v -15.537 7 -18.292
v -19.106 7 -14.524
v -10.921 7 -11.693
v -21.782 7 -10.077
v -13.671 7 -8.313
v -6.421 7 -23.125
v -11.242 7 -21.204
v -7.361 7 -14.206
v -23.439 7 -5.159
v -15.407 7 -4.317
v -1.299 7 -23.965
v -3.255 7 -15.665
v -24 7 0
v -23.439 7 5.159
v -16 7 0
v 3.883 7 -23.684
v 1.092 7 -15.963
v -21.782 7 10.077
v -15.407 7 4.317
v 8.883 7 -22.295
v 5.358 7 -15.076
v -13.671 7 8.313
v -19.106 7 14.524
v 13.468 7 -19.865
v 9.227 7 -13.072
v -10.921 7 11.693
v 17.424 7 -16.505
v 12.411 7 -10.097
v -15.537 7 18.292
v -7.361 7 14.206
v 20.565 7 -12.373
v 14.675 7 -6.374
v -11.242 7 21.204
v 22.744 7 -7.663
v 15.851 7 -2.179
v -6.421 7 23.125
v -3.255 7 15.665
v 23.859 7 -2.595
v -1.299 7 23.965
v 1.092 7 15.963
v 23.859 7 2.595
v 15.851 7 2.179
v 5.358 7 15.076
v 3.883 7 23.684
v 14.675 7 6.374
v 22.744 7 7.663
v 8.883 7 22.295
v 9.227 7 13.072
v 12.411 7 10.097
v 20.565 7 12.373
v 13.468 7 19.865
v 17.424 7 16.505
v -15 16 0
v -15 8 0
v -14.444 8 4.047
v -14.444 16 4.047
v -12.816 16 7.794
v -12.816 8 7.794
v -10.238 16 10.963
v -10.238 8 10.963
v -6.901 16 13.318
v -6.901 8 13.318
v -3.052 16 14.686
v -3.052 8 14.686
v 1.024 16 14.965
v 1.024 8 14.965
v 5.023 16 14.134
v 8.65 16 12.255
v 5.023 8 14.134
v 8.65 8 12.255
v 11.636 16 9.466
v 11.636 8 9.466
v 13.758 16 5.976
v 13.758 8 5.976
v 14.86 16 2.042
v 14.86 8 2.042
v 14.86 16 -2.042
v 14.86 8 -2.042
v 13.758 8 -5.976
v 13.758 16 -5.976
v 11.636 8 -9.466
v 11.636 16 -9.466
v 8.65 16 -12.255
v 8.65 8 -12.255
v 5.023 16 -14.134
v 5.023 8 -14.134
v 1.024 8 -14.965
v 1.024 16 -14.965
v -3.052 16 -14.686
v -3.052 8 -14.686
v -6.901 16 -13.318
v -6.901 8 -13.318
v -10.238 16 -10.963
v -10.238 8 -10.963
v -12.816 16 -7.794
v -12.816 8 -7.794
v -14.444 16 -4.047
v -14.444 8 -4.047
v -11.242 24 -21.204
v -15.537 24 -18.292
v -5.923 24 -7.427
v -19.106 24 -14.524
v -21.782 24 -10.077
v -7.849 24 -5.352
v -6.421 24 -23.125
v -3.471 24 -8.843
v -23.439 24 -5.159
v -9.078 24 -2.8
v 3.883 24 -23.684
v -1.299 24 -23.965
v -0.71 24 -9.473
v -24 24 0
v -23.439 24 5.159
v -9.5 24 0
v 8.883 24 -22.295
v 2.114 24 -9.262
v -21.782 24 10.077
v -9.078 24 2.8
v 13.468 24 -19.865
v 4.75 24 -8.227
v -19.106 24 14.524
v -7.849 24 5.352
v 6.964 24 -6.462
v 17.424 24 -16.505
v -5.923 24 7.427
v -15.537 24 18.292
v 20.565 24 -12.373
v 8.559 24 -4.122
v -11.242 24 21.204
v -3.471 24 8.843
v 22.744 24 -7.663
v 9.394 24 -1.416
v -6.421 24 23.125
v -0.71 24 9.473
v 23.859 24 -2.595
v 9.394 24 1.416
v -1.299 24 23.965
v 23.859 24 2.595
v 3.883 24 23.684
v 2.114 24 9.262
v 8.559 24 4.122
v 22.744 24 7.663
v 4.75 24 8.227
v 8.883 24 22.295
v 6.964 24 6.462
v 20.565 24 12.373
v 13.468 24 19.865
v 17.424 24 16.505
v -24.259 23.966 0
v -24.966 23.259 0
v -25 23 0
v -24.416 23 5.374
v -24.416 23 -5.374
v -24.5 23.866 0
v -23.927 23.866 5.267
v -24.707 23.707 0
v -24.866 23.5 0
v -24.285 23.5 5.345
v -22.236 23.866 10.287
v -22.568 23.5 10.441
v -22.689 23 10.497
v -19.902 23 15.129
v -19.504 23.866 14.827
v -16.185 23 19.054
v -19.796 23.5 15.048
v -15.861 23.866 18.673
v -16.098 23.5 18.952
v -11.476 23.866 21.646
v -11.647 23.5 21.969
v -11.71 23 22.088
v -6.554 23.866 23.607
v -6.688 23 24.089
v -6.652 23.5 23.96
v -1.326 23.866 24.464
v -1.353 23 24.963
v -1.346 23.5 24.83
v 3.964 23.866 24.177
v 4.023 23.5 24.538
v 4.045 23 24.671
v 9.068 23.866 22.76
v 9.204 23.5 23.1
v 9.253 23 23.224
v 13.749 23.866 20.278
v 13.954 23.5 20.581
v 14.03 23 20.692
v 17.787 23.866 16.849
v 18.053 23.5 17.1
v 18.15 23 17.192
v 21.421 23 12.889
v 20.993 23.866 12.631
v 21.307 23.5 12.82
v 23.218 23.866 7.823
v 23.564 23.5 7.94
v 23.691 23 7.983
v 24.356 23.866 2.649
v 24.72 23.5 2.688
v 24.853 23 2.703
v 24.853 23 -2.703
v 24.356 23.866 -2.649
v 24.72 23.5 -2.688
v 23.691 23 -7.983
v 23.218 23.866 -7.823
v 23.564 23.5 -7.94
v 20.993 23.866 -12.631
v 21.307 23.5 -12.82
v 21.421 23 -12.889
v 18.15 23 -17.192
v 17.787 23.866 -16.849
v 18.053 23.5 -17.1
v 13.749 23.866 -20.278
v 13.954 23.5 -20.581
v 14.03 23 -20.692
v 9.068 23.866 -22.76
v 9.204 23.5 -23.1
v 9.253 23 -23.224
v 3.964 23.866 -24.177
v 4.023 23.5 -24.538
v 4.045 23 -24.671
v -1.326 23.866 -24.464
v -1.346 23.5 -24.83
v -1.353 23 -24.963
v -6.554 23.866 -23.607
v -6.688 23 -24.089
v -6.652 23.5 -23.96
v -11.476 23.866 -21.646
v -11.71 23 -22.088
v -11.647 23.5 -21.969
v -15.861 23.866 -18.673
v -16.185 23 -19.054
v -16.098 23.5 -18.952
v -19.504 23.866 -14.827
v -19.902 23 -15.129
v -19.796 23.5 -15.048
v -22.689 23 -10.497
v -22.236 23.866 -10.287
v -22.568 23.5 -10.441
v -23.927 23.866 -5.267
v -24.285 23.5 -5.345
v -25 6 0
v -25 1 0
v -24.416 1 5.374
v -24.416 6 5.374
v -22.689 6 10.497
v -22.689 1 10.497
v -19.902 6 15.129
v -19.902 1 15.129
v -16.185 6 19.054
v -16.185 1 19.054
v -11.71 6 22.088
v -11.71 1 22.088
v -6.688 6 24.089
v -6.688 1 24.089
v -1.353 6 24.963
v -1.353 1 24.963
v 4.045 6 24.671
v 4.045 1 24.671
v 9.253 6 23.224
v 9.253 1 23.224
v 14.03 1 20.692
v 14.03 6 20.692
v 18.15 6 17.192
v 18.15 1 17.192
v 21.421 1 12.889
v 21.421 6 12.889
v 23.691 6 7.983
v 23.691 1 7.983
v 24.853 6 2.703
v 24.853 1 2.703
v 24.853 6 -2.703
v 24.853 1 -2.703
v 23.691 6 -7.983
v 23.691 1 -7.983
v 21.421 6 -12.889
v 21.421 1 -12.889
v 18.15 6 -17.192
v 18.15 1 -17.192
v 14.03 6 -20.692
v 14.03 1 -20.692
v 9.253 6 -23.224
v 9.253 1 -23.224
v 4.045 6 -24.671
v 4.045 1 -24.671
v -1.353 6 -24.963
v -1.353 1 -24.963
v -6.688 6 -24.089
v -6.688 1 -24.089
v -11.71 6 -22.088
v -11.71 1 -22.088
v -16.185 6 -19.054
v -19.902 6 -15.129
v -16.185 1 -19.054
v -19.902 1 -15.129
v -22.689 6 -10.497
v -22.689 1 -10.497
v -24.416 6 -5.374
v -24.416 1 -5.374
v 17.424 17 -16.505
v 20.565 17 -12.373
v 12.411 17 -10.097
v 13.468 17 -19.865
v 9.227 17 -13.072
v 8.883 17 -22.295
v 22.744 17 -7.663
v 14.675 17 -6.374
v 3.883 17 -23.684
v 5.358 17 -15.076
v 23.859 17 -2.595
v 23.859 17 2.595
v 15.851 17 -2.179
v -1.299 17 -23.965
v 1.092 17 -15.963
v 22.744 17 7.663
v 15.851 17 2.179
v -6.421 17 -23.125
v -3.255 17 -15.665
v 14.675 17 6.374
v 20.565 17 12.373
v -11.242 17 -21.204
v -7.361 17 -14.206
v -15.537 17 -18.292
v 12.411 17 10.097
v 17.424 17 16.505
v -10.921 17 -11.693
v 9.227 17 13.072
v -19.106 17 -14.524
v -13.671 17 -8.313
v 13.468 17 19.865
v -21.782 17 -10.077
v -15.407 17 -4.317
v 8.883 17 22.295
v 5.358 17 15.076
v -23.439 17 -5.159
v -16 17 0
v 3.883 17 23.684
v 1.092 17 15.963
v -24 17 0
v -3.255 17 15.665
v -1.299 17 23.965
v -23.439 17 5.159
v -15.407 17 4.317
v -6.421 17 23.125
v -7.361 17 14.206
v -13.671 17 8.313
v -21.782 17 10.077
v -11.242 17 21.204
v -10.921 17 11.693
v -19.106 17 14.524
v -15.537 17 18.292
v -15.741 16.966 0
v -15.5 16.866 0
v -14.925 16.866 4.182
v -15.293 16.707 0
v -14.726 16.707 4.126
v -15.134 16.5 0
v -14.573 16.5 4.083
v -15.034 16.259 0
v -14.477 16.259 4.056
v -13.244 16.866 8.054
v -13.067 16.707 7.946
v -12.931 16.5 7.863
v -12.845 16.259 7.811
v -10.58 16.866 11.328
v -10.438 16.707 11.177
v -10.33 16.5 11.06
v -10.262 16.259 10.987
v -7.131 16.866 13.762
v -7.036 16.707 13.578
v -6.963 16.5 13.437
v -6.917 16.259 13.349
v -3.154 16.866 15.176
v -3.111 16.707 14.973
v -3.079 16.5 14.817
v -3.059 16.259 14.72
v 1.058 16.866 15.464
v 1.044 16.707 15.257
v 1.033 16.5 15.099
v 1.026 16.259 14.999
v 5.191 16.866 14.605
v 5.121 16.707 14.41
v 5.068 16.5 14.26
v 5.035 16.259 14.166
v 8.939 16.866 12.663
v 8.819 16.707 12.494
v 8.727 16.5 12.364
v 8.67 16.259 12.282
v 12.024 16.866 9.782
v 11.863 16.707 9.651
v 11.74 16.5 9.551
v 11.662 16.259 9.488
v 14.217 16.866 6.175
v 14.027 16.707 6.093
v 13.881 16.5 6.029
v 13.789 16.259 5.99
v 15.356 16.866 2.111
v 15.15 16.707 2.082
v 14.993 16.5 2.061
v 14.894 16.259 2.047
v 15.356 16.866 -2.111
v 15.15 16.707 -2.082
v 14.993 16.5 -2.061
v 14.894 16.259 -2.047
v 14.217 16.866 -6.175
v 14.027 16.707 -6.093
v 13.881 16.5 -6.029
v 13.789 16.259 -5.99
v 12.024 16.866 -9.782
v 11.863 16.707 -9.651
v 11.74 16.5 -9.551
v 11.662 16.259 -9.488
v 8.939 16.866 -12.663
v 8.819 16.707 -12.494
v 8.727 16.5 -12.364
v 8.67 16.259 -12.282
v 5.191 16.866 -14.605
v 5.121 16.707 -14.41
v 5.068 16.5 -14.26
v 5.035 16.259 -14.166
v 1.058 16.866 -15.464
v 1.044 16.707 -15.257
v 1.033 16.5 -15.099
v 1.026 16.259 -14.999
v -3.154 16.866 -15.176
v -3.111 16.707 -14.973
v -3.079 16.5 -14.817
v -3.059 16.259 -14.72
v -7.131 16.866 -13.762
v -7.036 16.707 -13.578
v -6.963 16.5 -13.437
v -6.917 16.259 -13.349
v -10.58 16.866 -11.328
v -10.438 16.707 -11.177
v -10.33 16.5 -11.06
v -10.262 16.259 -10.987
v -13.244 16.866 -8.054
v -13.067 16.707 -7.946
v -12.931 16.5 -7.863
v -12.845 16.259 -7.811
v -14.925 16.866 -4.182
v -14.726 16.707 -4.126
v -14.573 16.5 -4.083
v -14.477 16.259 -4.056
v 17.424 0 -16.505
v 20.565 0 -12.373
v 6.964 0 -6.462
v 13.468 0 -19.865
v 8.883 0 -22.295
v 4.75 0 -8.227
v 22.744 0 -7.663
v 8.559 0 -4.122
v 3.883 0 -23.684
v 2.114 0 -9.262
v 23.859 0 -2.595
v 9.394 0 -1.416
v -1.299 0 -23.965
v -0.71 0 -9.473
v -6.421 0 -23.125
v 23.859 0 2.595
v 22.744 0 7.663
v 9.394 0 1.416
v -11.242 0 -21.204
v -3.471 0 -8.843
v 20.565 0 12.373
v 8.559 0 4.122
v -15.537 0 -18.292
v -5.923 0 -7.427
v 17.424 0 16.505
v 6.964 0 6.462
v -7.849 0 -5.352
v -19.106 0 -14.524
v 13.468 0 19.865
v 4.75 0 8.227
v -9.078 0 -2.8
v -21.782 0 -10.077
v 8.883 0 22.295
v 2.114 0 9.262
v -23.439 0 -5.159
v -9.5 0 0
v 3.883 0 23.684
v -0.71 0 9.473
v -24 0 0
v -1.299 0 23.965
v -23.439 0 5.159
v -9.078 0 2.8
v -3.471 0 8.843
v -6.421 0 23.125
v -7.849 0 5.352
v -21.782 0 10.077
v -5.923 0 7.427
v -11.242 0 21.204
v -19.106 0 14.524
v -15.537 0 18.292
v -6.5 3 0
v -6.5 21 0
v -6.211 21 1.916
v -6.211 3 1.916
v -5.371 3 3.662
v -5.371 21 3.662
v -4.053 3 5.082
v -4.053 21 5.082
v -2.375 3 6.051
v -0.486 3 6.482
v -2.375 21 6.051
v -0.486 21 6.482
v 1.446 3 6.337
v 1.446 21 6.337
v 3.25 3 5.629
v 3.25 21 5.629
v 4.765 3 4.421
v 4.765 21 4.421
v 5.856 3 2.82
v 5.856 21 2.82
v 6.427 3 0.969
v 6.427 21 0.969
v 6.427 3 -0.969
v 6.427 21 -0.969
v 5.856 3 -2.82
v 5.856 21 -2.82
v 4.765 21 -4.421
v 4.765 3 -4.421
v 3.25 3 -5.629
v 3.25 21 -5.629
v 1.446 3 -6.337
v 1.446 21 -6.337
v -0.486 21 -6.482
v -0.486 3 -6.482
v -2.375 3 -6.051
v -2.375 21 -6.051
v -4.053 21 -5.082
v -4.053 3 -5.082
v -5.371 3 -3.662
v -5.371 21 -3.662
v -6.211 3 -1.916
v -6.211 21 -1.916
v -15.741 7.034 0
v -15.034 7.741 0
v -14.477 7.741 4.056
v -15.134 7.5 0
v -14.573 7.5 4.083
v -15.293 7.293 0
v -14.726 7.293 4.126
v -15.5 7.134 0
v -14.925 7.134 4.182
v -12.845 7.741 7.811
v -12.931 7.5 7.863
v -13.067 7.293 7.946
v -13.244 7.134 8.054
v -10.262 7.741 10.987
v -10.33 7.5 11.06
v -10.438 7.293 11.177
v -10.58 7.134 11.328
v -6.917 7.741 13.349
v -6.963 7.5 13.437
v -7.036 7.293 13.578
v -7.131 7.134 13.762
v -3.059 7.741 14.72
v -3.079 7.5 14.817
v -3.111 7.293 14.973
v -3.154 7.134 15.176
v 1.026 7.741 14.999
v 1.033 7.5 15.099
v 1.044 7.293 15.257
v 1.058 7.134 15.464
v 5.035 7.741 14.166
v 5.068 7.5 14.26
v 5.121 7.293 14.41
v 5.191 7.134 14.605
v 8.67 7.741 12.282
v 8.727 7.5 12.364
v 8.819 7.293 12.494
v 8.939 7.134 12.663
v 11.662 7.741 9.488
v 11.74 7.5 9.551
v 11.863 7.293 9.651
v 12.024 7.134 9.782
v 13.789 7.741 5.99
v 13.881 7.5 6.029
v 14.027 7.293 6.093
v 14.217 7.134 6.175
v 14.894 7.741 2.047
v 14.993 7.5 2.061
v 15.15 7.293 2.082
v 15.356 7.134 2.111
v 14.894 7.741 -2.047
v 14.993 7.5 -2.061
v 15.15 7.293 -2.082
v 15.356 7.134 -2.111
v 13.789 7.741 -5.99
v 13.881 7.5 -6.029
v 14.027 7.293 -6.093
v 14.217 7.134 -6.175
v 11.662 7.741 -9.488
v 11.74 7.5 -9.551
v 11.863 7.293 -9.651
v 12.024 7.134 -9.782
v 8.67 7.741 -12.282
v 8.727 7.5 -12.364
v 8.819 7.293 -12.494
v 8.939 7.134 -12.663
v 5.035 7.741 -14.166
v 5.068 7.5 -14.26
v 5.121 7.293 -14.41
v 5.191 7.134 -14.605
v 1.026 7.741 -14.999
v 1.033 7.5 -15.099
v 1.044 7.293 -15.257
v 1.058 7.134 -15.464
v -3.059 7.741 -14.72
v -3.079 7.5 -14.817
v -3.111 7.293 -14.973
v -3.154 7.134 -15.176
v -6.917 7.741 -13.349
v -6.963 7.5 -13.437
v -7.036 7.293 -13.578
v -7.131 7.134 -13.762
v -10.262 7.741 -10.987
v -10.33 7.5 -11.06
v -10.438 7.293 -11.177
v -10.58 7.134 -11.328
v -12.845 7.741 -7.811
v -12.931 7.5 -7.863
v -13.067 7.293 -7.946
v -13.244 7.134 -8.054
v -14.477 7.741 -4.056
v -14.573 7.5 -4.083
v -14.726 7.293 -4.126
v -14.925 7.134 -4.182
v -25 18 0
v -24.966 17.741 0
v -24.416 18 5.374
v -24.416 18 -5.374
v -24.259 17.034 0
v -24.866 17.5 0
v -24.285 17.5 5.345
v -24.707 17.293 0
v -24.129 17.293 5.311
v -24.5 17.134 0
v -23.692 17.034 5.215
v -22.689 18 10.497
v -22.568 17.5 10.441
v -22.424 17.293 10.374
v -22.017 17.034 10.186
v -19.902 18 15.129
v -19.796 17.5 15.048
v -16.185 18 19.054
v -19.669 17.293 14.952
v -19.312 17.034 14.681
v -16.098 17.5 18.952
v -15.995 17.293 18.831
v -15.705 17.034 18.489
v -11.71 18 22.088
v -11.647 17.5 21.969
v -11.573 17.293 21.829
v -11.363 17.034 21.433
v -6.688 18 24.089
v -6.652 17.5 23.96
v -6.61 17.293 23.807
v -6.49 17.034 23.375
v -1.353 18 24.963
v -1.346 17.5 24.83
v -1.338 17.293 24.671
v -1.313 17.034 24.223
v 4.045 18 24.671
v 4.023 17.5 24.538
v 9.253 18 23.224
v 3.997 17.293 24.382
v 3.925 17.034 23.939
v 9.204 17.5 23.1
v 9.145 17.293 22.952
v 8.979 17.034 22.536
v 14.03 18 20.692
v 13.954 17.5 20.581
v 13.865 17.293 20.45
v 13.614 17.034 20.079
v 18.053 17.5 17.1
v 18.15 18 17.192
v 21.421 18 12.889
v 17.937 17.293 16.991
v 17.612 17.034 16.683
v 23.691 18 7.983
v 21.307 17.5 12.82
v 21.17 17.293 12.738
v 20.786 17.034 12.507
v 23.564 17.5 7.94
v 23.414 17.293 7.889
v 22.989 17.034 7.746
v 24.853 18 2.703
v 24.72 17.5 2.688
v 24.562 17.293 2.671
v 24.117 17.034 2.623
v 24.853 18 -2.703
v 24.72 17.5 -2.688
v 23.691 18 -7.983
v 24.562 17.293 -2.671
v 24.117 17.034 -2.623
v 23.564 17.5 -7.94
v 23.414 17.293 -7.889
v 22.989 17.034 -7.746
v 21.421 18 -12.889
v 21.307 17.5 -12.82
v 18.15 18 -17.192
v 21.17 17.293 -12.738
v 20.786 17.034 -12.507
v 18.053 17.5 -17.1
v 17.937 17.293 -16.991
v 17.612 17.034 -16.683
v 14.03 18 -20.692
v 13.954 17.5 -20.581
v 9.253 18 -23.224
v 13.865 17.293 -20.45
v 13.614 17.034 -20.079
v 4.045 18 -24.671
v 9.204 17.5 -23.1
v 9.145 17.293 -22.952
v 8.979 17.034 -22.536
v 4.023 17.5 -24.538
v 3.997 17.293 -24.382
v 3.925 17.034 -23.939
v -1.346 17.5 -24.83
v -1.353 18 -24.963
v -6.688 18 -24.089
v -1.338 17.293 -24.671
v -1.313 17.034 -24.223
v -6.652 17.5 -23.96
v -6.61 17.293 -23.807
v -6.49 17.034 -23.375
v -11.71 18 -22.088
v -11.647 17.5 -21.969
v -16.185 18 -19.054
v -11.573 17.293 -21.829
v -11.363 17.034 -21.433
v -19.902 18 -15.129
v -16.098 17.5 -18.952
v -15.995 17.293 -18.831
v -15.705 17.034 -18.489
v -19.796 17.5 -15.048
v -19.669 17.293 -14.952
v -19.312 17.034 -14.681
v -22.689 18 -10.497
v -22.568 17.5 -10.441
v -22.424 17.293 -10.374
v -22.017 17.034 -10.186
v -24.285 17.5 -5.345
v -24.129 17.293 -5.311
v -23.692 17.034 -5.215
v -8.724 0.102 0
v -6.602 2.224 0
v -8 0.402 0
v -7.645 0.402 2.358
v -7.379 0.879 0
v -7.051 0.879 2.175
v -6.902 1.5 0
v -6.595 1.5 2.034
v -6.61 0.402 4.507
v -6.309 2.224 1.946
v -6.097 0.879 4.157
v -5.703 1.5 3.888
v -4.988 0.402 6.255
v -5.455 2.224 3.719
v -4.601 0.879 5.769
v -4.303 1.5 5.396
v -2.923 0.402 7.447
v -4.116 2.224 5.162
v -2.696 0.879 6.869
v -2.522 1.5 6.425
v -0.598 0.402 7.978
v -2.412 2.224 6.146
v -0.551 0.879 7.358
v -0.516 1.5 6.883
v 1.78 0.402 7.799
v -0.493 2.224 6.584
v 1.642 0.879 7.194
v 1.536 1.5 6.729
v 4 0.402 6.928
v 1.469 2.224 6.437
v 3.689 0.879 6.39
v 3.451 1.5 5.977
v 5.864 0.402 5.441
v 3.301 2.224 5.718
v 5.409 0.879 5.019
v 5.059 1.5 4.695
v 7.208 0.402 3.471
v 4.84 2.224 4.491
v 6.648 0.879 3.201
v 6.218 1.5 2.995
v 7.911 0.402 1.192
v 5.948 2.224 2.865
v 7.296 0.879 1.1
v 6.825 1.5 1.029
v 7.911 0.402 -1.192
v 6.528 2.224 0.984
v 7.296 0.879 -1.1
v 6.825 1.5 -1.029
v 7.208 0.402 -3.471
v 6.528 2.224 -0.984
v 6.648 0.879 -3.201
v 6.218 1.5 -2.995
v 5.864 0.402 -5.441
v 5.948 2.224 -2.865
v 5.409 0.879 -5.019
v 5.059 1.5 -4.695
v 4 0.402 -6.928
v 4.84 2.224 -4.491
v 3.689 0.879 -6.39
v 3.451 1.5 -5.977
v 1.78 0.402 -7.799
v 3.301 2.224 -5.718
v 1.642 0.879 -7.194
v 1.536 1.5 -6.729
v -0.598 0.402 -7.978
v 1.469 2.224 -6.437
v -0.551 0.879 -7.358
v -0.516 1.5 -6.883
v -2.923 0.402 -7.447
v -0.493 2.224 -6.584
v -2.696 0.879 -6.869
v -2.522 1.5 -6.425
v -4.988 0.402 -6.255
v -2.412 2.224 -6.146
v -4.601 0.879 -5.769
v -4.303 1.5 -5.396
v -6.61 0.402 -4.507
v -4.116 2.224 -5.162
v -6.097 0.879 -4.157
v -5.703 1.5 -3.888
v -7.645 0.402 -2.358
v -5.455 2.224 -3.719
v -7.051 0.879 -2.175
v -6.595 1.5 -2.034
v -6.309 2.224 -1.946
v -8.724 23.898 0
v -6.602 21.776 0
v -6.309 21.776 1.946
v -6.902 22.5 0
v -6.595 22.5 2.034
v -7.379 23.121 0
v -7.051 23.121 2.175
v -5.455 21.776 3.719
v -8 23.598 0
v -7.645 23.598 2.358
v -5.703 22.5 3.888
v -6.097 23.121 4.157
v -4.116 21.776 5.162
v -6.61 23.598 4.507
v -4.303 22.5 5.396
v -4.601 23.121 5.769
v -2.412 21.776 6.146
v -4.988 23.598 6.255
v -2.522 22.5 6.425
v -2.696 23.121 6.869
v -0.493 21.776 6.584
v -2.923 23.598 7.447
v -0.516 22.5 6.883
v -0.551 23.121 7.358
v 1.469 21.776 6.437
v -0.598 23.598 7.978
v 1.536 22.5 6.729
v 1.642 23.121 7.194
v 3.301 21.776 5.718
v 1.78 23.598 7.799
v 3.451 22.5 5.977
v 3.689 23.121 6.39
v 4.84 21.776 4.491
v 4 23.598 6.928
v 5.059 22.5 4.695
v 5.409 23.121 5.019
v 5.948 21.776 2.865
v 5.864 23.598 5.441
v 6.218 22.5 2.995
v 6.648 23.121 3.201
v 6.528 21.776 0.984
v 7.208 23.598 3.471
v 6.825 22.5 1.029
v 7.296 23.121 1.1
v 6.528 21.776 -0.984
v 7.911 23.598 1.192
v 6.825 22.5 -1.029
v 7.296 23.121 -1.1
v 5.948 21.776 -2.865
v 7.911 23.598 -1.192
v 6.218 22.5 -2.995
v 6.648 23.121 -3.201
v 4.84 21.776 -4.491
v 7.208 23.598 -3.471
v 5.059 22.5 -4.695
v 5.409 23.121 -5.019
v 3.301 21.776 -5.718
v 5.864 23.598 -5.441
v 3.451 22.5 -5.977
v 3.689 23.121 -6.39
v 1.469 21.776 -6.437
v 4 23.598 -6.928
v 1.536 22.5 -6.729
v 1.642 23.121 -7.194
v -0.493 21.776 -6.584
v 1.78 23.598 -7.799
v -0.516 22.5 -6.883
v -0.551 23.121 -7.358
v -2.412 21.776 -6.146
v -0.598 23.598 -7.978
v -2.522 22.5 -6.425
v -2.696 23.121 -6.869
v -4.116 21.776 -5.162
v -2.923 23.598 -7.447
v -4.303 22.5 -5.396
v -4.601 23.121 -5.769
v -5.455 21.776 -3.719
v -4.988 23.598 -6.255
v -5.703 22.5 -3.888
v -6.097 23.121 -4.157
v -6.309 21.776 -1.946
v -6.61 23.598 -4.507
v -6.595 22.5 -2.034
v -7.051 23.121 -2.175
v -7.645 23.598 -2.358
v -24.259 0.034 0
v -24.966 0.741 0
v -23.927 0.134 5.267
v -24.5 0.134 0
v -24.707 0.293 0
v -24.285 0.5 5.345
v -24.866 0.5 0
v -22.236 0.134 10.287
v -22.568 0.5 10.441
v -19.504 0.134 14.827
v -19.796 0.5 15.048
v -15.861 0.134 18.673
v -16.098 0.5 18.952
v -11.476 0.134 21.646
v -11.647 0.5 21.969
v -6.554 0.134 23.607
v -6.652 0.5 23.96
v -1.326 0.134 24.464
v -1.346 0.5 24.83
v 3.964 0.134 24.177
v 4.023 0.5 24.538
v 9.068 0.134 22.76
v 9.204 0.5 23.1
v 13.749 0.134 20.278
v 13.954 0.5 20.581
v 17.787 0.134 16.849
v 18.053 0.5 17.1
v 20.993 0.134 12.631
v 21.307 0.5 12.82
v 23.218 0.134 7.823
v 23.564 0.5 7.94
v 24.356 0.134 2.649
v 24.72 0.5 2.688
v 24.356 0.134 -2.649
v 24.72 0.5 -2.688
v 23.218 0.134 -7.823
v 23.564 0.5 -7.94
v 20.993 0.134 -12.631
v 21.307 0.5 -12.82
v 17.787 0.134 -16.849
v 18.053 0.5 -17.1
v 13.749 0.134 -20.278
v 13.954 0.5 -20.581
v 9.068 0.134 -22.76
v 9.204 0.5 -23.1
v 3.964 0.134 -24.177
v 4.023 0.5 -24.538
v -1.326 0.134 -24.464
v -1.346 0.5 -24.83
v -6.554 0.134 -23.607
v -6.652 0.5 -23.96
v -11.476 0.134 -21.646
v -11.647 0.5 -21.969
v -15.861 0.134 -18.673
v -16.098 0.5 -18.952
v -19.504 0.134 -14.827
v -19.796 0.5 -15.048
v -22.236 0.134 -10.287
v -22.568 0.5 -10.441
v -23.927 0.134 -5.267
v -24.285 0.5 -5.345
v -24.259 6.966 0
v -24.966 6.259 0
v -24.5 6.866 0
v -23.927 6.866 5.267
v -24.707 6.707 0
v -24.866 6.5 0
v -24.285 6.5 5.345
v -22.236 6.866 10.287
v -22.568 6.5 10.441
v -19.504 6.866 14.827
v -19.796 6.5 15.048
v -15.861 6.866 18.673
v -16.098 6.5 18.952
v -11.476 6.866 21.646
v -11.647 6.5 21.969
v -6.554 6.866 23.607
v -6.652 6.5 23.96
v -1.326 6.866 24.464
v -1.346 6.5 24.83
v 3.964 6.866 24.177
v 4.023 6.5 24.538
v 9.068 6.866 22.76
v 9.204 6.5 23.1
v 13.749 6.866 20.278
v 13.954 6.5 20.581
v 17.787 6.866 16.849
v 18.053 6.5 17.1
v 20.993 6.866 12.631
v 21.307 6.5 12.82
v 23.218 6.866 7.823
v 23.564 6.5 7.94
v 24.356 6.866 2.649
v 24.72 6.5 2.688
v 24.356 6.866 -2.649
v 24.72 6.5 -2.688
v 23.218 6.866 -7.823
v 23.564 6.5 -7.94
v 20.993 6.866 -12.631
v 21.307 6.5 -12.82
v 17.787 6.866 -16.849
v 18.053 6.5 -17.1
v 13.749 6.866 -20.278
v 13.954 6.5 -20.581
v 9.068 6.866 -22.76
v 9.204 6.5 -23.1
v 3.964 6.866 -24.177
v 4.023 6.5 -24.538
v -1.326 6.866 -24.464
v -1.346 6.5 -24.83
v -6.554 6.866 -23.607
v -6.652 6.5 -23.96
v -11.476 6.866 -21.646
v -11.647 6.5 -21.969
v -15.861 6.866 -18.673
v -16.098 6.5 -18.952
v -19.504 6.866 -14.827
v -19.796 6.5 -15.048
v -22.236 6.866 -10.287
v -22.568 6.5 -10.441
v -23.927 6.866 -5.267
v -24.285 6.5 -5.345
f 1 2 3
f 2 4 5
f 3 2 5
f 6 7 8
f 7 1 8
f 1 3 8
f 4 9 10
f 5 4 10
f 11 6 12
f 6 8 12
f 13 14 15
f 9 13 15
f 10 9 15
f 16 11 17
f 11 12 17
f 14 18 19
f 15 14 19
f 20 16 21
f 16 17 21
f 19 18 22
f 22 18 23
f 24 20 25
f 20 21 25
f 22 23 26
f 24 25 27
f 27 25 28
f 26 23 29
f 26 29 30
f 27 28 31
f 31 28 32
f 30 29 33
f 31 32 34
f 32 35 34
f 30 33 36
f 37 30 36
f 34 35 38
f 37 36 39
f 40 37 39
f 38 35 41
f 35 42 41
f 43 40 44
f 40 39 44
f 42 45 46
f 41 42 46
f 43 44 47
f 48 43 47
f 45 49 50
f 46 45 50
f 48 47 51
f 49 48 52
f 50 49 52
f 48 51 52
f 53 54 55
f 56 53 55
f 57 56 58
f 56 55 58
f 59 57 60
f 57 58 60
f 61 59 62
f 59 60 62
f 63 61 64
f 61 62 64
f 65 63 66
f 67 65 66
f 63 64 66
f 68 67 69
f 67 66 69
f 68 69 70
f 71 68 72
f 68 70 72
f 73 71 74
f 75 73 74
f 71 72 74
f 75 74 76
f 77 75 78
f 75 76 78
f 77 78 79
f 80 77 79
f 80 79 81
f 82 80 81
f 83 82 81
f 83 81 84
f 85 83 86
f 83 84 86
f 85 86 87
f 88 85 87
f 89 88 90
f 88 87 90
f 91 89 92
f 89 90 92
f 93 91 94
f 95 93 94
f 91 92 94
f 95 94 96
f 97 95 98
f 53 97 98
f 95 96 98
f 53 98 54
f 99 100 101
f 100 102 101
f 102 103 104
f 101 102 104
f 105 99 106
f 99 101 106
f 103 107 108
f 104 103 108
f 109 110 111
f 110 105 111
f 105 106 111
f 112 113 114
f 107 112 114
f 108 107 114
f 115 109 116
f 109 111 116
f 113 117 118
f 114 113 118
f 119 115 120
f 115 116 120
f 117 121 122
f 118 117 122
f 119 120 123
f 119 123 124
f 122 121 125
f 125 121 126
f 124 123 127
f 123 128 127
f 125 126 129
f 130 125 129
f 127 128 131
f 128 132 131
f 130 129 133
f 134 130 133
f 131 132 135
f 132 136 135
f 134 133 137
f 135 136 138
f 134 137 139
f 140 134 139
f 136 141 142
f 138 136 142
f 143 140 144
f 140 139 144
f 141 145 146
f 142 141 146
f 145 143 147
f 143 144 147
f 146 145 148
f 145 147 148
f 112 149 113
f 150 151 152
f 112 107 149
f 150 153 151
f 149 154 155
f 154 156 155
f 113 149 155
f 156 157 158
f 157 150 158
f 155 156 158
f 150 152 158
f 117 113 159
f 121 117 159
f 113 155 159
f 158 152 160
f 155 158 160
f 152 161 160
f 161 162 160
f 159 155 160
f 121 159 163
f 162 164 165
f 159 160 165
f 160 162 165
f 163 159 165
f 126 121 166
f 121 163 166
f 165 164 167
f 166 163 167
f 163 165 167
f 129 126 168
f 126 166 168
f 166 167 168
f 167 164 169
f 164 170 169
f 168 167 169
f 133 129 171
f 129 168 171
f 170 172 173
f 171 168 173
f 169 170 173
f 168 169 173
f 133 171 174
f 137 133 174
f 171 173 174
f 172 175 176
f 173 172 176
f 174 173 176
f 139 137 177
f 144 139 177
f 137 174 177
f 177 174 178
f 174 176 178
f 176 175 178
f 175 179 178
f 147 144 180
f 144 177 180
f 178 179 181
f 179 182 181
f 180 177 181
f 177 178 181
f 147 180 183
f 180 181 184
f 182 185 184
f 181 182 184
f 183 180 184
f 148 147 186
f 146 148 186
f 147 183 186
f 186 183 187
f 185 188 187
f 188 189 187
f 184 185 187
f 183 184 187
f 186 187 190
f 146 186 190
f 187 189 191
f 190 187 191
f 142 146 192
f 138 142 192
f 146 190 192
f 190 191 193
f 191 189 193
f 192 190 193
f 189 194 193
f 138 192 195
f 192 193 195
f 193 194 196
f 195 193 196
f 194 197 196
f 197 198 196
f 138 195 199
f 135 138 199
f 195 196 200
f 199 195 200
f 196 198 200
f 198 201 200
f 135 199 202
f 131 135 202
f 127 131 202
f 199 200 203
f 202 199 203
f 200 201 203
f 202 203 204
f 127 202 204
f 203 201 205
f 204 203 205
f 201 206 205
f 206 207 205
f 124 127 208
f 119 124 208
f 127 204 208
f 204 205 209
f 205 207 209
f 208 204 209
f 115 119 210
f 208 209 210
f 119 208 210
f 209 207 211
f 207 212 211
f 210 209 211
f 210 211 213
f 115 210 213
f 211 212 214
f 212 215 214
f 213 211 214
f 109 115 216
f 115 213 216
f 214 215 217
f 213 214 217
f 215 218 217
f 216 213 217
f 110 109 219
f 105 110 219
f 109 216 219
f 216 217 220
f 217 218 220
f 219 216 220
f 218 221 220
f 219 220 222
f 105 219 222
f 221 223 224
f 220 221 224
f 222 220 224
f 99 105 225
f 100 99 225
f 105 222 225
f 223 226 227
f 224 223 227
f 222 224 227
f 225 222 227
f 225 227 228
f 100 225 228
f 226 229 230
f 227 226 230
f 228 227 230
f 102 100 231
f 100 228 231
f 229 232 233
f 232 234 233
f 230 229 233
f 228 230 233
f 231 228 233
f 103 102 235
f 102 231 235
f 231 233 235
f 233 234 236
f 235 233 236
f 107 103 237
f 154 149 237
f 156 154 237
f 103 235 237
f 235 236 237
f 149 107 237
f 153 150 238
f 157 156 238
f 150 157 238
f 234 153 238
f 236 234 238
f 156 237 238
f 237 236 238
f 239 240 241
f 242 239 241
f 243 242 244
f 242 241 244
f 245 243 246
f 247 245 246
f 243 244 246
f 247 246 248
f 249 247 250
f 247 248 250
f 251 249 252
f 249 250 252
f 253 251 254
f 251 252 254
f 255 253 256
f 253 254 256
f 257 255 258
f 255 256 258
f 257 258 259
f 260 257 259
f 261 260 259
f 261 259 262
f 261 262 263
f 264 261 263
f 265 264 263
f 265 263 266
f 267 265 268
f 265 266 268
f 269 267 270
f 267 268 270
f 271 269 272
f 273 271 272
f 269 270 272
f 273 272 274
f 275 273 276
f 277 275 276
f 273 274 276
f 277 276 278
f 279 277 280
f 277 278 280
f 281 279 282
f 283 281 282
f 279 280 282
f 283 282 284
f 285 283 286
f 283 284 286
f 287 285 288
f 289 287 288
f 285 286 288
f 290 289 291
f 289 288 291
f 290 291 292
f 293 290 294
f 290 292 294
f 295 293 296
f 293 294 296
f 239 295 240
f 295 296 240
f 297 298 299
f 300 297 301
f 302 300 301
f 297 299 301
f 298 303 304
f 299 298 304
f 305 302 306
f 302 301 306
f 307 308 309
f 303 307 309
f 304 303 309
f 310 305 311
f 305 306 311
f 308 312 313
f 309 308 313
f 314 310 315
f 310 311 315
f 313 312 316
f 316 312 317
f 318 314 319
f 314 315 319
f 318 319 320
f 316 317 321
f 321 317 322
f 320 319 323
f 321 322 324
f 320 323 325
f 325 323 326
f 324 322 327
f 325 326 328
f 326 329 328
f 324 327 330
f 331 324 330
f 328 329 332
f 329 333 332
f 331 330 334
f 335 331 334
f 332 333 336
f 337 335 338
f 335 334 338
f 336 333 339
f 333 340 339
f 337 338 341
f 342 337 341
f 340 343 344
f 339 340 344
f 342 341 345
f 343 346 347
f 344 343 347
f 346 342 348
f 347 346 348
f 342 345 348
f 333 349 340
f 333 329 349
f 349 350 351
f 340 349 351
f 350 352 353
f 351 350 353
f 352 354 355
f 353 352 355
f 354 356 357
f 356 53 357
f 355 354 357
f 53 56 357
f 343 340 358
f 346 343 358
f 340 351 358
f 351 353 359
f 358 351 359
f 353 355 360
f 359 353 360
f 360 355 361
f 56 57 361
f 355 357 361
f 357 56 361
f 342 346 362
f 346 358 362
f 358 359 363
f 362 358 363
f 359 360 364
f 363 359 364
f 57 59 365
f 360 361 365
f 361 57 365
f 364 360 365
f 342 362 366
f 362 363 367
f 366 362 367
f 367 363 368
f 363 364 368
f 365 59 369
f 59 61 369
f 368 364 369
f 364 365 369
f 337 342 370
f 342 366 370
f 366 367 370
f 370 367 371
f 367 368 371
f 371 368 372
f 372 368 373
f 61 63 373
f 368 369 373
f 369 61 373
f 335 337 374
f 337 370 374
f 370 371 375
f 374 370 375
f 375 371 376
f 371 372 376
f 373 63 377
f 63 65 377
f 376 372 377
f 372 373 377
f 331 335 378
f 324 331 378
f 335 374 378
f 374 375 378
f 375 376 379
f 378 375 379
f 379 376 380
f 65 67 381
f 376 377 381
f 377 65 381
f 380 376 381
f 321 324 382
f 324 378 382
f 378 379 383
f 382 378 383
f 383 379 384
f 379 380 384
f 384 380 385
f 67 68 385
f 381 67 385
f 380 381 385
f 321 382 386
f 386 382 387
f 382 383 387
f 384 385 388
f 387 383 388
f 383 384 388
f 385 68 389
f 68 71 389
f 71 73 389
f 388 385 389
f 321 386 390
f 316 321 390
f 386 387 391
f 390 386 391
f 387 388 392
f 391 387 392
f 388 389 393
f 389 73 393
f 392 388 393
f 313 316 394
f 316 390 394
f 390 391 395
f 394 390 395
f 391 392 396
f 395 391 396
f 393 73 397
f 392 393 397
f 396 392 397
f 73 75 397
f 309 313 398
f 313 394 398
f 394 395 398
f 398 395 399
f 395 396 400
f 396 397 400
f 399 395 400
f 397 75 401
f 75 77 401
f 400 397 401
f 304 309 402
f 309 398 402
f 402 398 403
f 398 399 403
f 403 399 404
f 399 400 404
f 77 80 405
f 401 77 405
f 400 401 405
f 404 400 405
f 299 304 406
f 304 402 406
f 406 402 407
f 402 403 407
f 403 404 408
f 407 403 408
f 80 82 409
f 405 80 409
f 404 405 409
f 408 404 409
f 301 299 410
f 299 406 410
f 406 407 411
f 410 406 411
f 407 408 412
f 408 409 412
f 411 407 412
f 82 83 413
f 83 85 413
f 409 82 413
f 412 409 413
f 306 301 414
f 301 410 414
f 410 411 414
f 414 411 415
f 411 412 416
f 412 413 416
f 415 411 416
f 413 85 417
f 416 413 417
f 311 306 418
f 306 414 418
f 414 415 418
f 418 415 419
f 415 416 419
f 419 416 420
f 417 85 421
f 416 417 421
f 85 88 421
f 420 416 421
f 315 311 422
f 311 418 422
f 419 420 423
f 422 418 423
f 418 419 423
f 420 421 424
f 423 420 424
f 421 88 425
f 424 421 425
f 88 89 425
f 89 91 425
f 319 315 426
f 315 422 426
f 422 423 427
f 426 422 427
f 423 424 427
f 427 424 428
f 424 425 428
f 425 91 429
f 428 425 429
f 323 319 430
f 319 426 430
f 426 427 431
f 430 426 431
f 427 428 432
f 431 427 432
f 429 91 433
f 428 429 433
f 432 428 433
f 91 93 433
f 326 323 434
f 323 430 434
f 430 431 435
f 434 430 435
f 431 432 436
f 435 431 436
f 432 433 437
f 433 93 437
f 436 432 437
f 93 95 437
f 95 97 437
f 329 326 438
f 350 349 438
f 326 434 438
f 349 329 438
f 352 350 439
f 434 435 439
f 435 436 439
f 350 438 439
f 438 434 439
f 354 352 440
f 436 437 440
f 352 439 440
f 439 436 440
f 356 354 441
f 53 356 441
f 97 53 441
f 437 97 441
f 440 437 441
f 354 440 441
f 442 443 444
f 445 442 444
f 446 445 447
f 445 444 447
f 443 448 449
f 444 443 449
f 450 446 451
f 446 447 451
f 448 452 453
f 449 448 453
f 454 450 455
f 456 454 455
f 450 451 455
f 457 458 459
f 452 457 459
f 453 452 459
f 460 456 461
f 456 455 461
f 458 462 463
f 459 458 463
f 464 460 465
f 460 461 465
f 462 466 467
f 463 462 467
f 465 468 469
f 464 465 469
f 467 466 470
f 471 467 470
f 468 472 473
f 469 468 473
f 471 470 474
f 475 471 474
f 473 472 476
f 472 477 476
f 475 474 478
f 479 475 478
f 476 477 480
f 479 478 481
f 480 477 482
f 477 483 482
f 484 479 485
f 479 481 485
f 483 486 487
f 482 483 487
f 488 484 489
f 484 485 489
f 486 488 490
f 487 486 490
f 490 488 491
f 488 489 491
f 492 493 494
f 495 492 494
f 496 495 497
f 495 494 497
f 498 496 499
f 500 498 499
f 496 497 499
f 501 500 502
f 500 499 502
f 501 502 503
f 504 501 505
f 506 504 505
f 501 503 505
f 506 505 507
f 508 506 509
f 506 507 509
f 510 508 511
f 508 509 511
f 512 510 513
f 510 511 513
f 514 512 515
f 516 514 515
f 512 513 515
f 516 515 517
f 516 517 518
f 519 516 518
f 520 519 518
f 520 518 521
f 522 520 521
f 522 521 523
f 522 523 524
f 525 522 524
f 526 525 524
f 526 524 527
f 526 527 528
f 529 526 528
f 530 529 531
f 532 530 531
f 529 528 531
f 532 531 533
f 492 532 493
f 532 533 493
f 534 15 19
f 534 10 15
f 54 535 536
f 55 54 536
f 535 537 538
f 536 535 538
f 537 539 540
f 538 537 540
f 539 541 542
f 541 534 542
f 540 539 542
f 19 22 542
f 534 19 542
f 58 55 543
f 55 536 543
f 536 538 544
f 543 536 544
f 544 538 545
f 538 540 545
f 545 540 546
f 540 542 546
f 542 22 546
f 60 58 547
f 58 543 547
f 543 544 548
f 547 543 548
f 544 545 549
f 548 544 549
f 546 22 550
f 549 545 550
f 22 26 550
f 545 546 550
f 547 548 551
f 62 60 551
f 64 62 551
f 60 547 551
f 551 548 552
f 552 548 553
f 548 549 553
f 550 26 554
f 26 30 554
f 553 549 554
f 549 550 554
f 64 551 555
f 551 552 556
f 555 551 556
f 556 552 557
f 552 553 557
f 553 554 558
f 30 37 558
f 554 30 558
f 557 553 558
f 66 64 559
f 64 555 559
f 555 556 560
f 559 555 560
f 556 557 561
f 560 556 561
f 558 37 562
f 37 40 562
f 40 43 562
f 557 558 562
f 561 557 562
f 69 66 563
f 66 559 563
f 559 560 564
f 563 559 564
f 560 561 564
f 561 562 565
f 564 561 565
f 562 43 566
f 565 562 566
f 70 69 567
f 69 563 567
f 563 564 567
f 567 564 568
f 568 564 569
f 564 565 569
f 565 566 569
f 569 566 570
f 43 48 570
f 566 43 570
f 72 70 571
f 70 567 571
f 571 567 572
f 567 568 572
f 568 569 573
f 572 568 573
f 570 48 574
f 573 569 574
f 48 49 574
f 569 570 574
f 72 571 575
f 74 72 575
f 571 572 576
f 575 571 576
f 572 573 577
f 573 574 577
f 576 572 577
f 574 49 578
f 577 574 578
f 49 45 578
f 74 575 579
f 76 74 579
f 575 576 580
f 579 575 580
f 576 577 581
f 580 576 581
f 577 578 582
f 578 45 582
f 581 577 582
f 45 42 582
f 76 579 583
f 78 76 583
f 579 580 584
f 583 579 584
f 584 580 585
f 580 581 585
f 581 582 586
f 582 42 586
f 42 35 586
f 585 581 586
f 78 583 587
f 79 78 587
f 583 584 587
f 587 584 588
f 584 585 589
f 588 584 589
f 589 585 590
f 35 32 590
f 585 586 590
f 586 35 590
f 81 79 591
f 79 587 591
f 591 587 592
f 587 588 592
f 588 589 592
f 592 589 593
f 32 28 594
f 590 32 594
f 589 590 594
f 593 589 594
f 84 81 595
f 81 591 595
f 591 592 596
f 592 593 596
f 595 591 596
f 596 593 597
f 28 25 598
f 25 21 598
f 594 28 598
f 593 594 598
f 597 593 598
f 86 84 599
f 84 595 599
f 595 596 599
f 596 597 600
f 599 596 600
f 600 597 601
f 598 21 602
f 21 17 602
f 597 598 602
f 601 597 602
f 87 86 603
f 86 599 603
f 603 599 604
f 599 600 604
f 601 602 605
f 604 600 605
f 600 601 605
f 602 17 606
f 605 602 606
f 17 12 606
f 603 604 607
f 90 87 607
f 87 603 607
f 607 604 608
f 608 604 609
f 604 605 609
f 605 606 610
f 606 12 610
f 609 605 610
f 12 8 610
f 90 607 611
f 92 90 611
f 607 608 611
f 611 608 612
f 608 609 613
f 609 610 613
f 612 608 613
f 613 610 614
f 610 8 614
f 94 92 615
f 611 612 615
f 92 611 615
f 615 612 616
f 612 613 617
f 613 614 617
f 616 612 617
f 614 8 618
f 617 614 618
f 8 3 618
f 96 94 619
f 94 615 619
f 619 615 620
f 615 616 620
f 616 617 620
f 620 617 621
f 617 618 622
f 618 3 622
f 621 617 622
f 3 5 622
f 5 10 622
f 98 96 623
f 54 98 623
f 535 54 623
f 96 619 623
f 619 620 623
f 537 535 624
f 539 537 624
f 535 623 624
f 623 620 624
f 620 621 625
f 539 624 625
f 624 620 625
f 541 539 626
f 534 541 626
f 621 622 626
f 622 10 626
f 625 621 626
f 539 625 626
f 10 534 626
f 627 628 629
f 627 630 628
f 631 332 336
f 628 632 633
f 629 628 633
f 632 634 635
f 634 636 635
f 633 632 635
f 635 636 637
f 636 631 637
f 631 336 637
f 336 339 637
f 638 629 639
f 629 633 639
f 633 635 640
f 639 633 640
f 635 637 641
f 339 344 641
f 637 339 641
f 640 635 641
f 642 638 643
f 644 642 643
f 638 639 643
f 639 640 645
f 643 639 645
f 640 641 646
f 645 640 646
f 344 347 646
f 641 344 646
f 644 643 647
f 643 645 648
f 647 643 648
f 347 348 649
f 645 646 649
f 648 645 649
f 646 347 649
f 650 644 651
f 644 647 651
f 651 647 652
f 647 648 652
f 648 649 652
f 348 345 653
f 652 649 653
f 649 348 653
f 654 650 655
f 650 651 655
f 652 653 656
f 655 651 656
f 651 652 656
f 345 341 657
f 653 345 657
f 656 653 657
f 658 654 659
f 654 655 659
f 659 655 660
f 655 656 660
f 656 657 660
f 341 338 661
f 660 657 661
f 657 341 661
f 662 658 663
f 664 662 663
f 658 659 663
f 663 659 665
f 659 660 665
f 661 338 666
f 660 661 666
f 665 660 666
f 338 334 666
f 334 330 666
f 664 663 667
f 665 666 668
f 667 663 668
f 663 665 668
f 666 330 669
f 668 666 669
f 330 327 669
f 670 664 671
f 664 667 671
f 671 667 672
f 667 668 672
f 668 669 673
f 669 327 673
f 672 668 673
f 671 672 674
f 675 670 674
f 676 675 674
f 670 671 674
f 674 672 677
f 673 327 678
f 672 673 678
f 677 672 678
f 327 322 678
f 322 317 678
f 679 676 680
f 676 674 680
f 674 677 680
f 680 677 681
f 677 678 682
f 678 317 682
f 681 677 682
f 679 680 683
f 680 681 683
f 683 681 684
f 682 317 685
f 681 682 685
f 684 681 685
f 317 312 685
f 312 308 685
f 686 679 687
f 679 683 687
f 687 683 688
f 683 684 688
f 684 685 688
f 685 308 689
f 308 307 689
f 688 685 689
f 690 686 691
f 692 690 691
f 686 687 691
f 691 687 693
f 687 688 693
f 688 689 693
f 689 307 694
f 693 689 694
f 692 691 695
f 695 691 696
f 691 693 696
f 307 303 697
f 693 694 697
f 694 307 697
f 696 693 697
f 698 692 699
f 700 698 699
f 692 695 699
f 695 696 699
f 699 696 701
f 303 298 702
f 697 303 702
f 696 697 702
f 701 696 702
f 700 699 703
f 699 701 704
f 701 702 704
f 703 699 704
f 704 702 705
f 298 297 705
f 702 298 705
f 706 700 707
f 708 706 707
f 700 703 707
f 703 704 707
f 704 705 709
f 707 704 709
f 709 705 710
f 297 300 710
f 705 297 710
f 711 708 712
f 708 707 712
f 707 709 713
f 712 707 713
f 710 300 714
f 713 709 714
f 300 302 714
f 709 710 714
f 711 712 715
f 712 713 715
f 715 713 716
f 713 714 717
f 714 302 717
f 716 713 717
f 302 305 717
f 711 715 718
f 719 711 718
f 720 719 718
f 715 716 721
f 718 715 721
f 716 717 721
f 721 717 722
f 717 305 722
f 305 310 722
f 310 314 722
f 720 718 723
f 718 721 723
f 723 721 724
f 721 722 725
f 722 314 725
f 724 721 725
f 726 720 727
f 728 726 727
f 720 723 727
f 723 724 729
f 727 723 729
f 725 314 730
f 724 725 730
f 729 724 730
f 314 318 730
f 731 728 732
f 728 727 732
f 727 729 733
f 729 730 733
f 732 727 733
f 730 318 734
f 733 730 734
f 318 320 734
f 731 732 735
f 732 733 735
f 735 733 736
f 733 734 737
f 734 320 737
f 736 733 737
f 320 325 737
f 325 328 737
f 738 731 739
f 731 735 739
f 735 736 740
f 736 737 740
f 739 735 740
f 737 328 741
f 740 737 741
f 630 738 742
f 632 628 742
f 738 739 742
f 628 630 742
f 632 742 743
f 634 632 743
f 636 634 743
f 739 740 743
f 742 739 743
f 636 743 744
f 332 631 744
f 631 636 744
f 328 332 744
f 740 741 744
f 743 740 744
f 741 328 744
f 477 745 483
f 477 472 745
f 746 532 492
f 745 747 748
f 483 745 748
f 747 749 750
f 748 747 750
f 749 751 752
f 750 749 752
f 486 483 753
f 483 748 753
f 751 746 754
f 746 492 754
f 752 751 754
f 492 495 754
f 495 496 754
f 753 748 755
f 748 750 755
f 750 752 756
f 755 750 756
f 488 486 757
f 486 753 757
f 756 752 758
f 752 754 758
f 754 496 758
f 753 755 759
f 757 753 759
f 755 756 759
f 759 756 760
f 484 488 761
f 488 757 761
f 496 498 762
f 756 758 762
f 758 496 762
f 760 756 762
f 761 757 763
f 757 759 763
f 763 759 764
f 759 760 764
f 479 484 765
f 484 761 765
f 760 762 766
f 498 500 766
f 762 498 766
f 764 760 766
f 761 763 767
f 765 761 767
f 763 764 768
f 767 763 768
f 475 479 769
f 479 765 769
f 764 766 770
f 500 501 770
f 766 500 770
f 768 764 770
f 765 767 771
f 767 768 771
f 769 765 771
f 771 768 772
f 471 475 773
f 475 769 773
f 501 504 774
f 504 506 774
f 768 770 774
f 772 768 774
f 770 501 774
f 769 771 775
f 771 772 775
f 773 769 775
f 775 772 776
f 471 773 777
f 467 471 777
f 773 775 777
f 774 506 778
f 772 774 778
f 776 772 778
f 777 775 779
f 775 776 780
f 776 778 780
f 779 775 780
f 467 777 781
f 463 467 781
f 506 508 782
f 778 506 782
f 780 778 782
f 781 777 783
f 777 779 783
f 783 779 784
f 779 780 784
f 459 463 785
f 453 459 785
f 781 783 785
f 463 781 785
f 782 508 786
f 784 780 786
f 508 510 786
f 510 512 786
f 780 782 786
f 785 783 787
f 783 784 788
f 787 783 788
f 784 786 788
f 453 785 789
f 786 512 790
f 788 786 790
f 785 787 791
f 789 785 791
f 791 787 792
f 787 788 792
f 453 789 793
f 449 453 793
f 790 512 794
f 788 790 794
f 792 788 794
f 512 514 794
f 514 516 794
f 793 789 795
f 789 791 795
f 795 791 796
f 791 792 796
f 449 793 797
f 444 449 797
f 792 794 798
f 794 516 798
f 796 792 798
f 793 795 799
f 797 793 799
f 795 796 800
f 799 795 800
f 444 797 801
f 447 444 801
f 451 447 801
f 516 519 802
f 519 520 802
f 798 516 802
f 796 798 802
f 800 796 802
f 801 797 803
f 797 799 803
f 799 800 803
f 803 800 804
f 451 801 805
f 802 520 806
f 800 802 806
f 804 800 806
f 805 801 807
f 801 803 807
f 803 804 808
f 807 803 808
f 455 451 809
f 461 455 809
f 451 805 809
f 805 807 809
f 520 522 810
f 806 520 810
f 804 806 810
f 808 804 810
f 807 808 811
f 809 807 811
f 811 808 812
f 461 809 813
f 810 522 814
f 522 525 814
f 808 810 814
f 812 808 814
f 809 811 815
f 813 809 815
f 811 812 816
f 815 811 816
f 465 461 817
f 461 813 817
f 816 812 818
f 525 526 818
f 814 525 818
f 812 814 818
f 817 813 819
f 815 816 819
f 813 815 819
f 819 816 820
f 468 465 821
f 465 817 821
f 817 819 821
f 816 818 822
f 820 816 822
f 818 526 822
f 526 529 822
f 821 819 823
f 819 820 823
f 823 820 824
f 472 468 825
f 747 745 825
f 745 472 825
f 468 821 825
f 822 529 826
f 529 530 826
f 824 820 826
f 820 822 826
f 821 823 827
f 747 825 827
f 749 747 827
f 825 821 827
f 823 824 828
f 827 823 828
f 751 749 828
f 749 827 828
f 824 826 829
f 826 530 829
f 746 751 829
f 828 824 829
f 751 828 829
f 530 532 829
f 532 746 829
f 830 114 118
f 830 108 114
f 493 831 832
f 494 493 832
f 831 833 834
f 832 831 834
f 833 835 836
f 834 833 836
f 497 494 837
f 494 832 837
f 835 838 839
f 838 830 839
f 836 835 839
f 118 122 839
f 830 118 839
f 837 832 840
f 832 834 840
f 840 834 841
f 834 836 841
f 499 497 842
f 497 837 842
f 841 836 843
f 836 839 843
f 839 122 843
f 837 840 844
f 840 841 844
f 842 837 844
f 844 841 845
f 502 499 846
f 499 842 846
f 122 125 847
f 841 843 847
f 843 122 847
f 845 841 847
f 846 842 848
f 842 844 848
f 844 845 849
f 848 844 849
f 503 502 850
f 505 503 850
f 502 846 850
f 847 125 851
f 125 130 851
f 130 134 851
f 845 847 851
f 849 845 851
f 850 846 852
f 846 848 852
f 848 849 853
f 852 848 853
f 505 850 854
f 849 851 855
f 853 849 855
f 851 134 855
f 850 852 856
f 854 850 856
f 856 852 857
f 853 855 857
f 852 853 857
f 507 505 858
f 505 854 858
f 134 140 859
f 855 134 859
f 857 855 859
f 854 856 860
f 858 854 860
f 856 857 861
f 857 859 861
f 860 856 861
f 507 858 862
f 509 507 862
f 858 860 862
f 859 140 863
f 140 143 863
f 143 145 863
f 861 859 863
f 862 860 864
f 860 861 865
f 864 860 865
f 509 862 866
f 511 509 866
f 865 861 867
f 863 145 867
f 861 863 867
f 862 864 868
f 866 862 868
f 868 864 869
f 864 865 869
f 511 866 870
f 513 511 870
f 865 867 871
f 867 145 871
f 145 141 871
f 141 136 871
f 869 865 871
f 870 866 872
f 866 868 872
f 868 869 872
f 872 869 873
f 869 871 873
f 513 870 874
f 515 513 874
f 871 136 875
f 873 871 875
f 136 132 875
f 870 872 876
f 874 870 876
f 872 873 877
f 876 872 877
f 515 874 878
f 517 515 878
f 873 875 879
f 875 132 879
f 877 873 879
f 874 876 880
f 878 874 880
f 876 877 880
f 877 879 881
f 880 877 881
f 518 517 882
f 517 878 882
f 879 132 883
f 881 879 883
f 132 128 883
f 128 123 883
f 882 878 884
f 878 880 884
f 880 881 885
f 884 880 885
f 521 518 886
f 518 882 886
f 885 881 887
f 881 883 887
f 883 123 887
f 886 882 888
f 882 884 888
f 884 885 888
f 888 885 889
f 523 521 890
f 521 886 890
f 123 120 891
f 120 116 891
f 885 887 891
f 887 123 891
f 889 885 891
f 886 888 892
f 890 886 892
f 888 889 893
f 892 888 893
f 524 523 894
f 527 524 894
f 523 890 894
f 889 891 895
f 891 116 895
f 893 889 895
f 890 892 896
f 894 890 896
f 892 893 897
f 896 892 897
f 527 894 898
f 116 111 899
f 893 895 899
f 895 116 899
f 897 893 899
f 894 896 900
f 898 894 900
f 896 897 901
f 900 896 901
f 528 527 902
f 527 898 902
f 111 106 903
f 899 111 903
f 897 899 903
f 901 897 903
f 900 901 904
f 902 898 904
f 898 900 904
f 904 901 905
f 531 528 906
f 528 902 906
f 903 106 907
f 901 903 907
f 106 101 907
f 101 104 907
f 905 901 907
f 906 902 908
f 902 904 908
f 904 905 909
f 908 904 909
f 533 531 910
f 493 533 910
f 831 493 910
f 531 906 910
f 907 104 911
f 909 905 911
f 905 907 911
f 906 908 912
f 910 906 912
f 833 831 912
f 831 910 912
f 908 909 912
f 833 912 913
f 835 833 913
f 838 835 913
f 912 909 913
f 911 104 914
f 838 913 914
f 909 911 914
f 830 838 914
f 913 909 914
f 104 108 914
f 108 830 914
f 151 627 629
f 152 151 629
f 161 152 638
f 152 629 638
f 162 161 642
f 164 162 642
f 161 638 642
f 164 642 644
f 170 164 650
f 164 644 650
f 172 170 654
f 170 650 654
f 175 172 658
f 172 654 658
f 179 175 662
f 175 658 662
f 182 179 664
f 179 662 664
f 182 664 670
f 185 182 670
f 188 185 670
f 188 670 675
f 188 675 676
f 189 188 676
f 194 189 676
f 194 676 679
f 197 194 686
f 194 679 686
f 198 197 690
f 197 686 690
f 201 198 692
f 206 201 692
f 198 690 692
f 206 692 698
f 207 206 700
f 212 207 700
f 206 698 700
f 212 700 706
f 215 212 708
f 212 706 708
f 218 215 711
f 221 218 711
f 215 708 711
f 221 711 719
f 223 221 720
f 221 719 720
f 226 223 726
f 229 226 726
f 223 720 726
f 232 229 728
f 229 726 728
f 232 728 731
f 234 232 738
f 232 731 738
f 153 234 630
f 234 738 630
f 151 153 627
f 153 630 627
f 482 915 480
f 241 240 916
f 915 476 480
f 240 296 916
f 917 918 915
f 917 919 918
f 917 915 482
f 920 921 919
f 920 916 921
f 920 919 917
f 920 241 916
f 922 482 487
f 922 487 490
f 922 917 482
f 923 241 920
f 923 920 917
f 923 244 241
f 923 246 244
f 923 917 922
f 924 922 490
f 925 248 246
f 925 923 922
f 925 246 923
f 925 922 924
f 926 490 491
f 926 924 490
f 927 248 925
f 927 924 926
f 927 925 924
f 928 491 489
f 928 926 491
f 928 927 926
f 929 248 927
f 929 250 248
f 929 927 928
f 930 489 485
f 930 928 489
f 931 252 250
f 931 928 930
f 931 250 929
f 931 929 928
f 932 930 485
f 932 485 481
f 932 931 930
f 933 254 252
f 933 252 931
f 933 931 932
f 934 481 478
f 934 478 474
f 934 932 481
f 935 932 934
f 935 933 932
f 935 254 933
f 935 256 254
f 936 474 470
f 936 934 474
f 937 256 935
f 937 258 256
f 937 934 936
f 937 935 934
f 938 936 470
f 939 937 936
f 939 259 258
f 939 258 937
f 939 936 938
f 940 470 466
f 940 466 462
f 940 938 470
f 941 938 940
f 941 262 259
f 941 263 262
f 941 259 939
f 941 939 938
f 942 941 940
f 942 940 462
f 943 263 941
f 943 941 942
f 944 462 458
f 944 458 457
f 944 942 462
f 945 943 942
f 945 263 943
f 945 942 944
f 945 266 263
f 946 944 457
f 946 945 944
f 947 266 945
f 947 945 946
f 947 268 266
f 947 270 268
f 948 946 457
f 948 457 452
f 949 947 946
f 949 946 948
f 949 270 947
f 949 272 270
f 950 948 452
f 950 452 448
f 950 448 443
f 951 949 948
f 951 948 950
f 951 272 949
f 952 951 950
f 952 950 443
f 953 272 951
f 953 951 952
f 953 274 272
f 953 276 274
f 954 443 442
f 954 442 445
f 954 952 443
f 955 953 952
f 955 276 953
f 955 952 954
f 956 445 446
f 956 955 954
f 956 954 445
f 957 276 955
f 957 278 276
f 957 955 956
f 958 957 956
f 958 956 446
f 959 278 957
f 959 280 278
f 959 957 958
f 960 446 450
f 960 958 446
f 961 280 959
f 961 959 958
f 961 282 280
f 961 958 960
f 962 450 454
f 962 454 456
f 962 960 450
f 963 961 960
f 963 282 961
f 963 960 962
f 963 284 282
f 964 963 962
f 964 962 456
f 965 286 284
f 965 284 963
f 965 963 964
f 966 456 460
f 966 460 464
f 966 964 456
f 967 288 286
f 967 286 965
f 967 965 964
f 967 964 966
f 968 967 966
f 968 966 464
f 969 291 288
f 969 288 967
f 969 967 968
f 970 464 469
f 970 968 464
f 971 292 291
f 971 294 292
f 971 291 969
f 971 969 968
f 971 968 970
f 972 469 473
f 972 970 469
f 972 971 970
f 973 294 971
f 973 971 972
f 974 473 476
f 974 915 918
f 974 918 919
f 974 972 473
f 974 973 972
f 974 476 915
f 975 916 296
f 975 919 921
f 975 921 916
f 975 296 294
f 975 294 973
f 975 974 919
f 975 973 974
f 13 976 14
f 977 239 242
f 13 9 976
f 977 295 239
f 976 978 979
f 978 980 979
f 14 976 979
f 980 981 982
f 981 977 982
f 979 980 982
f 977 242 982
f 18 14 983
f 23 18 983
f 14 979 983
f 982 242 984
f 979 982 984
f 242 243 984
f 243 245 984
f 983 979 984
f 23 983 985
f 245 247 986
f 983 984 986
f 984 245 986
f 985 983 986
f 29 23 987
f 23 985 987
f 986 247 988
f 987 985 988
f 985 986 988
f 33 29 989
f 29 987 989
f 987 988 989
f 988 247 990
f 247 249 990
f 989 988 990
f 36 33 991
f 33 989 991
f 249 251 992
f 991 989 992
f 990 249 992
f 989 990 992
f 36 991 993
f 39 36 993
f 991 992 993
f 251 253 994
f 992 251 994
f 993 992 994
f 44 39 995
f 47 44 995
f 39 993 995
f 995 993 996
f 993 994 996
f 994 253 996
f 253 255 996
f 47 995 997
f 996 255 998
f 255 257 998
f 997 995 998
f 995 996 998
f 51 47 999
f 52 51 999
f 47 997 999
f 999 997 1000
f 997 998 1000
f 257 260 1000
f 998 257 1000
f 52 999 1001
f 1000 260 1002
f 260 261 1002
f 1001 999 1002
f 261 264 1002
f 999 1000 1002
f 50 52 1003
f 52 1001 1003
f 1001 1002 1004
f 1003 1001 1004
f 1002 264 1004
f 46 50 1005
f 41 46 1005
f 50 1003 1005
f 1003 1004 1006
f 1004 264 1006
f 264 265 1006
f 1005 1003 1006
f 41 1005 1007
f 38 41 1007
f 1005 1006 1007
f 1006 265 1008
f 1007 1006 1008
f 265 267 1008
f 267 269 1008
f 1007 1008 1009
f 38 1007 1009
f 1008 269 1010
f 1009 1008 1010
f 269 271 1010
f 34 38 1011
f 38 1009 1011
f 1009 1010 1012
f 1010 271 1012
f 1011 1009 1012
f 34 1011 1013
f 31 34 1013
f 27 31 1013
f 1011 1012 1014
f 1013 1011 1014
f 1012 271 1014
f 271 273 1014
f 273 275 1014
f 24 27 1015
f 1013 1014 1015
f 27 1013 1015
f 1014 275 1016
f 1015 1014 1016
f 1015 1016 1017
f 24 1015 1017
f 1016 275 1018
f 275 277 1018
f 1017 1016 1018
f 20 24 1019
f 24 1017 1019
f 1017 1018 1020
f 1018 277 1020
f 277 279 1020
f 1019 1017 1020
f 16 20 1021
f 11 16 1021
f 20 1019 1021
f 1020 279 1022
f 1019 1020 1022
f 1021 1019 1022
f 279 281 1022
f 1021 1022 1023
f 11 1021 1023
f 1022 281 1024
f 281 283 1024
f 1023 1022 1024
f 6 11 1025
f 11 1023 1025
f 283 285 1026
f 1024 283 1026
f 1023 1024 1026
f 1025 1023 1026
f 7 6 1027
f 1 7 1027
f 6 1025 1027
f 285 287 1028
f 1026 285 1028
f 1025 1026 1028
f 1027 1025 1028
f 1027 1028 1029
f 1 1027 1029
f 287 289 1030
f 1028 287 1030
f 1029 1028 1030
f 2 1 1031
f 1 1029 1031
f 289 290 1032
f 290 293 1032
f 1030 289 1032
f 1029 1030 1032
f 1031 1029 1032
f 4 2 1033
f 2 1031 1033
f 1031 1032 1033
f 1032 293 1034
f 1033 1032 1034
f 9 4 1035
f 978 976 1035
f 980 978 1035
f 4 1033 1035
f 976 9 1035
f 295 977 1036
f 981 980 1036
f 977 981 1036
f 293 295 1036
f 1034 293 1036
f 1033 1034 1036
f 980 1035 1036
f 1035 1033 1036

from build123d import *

# Parameters (mm, degrees)
F2_R = 1
F3_R = 3


with BuildPart() as f1:
    # F0 (on Top) → F1 (revolve)
    with BuildSketch(Plane.XY):
        Polygon((-25, 0), (-6.5, 0), (-6.5, 24), (-25, 24), (-25, 17), (-15, 17), (-15, 7), (-25, 7), align=None)
    revolve(axis=Axis((0, 12, 0), (0, 1, 0)))

    # F2
    f2_edges = [f1.edges().sort_by_distance(p)[0] for p in [
        (25, 0, 0),
        (25, 7, 0),
        (25, 17, 0),
        (25, 24, 0),
        (15, 7, 0),
        (15, 17, 0),
    ]]
    fillet(f2_edges, radius=F2_R)

    # F3
    f3_edges = [f1.edges().sort_by_distance(p)[0] for p in [
        (6.5, 24, 0),
        (6.5, 0, 0),
    ]]
    fillet(f3_edges, radius=F3_R)


solid = f1.part
